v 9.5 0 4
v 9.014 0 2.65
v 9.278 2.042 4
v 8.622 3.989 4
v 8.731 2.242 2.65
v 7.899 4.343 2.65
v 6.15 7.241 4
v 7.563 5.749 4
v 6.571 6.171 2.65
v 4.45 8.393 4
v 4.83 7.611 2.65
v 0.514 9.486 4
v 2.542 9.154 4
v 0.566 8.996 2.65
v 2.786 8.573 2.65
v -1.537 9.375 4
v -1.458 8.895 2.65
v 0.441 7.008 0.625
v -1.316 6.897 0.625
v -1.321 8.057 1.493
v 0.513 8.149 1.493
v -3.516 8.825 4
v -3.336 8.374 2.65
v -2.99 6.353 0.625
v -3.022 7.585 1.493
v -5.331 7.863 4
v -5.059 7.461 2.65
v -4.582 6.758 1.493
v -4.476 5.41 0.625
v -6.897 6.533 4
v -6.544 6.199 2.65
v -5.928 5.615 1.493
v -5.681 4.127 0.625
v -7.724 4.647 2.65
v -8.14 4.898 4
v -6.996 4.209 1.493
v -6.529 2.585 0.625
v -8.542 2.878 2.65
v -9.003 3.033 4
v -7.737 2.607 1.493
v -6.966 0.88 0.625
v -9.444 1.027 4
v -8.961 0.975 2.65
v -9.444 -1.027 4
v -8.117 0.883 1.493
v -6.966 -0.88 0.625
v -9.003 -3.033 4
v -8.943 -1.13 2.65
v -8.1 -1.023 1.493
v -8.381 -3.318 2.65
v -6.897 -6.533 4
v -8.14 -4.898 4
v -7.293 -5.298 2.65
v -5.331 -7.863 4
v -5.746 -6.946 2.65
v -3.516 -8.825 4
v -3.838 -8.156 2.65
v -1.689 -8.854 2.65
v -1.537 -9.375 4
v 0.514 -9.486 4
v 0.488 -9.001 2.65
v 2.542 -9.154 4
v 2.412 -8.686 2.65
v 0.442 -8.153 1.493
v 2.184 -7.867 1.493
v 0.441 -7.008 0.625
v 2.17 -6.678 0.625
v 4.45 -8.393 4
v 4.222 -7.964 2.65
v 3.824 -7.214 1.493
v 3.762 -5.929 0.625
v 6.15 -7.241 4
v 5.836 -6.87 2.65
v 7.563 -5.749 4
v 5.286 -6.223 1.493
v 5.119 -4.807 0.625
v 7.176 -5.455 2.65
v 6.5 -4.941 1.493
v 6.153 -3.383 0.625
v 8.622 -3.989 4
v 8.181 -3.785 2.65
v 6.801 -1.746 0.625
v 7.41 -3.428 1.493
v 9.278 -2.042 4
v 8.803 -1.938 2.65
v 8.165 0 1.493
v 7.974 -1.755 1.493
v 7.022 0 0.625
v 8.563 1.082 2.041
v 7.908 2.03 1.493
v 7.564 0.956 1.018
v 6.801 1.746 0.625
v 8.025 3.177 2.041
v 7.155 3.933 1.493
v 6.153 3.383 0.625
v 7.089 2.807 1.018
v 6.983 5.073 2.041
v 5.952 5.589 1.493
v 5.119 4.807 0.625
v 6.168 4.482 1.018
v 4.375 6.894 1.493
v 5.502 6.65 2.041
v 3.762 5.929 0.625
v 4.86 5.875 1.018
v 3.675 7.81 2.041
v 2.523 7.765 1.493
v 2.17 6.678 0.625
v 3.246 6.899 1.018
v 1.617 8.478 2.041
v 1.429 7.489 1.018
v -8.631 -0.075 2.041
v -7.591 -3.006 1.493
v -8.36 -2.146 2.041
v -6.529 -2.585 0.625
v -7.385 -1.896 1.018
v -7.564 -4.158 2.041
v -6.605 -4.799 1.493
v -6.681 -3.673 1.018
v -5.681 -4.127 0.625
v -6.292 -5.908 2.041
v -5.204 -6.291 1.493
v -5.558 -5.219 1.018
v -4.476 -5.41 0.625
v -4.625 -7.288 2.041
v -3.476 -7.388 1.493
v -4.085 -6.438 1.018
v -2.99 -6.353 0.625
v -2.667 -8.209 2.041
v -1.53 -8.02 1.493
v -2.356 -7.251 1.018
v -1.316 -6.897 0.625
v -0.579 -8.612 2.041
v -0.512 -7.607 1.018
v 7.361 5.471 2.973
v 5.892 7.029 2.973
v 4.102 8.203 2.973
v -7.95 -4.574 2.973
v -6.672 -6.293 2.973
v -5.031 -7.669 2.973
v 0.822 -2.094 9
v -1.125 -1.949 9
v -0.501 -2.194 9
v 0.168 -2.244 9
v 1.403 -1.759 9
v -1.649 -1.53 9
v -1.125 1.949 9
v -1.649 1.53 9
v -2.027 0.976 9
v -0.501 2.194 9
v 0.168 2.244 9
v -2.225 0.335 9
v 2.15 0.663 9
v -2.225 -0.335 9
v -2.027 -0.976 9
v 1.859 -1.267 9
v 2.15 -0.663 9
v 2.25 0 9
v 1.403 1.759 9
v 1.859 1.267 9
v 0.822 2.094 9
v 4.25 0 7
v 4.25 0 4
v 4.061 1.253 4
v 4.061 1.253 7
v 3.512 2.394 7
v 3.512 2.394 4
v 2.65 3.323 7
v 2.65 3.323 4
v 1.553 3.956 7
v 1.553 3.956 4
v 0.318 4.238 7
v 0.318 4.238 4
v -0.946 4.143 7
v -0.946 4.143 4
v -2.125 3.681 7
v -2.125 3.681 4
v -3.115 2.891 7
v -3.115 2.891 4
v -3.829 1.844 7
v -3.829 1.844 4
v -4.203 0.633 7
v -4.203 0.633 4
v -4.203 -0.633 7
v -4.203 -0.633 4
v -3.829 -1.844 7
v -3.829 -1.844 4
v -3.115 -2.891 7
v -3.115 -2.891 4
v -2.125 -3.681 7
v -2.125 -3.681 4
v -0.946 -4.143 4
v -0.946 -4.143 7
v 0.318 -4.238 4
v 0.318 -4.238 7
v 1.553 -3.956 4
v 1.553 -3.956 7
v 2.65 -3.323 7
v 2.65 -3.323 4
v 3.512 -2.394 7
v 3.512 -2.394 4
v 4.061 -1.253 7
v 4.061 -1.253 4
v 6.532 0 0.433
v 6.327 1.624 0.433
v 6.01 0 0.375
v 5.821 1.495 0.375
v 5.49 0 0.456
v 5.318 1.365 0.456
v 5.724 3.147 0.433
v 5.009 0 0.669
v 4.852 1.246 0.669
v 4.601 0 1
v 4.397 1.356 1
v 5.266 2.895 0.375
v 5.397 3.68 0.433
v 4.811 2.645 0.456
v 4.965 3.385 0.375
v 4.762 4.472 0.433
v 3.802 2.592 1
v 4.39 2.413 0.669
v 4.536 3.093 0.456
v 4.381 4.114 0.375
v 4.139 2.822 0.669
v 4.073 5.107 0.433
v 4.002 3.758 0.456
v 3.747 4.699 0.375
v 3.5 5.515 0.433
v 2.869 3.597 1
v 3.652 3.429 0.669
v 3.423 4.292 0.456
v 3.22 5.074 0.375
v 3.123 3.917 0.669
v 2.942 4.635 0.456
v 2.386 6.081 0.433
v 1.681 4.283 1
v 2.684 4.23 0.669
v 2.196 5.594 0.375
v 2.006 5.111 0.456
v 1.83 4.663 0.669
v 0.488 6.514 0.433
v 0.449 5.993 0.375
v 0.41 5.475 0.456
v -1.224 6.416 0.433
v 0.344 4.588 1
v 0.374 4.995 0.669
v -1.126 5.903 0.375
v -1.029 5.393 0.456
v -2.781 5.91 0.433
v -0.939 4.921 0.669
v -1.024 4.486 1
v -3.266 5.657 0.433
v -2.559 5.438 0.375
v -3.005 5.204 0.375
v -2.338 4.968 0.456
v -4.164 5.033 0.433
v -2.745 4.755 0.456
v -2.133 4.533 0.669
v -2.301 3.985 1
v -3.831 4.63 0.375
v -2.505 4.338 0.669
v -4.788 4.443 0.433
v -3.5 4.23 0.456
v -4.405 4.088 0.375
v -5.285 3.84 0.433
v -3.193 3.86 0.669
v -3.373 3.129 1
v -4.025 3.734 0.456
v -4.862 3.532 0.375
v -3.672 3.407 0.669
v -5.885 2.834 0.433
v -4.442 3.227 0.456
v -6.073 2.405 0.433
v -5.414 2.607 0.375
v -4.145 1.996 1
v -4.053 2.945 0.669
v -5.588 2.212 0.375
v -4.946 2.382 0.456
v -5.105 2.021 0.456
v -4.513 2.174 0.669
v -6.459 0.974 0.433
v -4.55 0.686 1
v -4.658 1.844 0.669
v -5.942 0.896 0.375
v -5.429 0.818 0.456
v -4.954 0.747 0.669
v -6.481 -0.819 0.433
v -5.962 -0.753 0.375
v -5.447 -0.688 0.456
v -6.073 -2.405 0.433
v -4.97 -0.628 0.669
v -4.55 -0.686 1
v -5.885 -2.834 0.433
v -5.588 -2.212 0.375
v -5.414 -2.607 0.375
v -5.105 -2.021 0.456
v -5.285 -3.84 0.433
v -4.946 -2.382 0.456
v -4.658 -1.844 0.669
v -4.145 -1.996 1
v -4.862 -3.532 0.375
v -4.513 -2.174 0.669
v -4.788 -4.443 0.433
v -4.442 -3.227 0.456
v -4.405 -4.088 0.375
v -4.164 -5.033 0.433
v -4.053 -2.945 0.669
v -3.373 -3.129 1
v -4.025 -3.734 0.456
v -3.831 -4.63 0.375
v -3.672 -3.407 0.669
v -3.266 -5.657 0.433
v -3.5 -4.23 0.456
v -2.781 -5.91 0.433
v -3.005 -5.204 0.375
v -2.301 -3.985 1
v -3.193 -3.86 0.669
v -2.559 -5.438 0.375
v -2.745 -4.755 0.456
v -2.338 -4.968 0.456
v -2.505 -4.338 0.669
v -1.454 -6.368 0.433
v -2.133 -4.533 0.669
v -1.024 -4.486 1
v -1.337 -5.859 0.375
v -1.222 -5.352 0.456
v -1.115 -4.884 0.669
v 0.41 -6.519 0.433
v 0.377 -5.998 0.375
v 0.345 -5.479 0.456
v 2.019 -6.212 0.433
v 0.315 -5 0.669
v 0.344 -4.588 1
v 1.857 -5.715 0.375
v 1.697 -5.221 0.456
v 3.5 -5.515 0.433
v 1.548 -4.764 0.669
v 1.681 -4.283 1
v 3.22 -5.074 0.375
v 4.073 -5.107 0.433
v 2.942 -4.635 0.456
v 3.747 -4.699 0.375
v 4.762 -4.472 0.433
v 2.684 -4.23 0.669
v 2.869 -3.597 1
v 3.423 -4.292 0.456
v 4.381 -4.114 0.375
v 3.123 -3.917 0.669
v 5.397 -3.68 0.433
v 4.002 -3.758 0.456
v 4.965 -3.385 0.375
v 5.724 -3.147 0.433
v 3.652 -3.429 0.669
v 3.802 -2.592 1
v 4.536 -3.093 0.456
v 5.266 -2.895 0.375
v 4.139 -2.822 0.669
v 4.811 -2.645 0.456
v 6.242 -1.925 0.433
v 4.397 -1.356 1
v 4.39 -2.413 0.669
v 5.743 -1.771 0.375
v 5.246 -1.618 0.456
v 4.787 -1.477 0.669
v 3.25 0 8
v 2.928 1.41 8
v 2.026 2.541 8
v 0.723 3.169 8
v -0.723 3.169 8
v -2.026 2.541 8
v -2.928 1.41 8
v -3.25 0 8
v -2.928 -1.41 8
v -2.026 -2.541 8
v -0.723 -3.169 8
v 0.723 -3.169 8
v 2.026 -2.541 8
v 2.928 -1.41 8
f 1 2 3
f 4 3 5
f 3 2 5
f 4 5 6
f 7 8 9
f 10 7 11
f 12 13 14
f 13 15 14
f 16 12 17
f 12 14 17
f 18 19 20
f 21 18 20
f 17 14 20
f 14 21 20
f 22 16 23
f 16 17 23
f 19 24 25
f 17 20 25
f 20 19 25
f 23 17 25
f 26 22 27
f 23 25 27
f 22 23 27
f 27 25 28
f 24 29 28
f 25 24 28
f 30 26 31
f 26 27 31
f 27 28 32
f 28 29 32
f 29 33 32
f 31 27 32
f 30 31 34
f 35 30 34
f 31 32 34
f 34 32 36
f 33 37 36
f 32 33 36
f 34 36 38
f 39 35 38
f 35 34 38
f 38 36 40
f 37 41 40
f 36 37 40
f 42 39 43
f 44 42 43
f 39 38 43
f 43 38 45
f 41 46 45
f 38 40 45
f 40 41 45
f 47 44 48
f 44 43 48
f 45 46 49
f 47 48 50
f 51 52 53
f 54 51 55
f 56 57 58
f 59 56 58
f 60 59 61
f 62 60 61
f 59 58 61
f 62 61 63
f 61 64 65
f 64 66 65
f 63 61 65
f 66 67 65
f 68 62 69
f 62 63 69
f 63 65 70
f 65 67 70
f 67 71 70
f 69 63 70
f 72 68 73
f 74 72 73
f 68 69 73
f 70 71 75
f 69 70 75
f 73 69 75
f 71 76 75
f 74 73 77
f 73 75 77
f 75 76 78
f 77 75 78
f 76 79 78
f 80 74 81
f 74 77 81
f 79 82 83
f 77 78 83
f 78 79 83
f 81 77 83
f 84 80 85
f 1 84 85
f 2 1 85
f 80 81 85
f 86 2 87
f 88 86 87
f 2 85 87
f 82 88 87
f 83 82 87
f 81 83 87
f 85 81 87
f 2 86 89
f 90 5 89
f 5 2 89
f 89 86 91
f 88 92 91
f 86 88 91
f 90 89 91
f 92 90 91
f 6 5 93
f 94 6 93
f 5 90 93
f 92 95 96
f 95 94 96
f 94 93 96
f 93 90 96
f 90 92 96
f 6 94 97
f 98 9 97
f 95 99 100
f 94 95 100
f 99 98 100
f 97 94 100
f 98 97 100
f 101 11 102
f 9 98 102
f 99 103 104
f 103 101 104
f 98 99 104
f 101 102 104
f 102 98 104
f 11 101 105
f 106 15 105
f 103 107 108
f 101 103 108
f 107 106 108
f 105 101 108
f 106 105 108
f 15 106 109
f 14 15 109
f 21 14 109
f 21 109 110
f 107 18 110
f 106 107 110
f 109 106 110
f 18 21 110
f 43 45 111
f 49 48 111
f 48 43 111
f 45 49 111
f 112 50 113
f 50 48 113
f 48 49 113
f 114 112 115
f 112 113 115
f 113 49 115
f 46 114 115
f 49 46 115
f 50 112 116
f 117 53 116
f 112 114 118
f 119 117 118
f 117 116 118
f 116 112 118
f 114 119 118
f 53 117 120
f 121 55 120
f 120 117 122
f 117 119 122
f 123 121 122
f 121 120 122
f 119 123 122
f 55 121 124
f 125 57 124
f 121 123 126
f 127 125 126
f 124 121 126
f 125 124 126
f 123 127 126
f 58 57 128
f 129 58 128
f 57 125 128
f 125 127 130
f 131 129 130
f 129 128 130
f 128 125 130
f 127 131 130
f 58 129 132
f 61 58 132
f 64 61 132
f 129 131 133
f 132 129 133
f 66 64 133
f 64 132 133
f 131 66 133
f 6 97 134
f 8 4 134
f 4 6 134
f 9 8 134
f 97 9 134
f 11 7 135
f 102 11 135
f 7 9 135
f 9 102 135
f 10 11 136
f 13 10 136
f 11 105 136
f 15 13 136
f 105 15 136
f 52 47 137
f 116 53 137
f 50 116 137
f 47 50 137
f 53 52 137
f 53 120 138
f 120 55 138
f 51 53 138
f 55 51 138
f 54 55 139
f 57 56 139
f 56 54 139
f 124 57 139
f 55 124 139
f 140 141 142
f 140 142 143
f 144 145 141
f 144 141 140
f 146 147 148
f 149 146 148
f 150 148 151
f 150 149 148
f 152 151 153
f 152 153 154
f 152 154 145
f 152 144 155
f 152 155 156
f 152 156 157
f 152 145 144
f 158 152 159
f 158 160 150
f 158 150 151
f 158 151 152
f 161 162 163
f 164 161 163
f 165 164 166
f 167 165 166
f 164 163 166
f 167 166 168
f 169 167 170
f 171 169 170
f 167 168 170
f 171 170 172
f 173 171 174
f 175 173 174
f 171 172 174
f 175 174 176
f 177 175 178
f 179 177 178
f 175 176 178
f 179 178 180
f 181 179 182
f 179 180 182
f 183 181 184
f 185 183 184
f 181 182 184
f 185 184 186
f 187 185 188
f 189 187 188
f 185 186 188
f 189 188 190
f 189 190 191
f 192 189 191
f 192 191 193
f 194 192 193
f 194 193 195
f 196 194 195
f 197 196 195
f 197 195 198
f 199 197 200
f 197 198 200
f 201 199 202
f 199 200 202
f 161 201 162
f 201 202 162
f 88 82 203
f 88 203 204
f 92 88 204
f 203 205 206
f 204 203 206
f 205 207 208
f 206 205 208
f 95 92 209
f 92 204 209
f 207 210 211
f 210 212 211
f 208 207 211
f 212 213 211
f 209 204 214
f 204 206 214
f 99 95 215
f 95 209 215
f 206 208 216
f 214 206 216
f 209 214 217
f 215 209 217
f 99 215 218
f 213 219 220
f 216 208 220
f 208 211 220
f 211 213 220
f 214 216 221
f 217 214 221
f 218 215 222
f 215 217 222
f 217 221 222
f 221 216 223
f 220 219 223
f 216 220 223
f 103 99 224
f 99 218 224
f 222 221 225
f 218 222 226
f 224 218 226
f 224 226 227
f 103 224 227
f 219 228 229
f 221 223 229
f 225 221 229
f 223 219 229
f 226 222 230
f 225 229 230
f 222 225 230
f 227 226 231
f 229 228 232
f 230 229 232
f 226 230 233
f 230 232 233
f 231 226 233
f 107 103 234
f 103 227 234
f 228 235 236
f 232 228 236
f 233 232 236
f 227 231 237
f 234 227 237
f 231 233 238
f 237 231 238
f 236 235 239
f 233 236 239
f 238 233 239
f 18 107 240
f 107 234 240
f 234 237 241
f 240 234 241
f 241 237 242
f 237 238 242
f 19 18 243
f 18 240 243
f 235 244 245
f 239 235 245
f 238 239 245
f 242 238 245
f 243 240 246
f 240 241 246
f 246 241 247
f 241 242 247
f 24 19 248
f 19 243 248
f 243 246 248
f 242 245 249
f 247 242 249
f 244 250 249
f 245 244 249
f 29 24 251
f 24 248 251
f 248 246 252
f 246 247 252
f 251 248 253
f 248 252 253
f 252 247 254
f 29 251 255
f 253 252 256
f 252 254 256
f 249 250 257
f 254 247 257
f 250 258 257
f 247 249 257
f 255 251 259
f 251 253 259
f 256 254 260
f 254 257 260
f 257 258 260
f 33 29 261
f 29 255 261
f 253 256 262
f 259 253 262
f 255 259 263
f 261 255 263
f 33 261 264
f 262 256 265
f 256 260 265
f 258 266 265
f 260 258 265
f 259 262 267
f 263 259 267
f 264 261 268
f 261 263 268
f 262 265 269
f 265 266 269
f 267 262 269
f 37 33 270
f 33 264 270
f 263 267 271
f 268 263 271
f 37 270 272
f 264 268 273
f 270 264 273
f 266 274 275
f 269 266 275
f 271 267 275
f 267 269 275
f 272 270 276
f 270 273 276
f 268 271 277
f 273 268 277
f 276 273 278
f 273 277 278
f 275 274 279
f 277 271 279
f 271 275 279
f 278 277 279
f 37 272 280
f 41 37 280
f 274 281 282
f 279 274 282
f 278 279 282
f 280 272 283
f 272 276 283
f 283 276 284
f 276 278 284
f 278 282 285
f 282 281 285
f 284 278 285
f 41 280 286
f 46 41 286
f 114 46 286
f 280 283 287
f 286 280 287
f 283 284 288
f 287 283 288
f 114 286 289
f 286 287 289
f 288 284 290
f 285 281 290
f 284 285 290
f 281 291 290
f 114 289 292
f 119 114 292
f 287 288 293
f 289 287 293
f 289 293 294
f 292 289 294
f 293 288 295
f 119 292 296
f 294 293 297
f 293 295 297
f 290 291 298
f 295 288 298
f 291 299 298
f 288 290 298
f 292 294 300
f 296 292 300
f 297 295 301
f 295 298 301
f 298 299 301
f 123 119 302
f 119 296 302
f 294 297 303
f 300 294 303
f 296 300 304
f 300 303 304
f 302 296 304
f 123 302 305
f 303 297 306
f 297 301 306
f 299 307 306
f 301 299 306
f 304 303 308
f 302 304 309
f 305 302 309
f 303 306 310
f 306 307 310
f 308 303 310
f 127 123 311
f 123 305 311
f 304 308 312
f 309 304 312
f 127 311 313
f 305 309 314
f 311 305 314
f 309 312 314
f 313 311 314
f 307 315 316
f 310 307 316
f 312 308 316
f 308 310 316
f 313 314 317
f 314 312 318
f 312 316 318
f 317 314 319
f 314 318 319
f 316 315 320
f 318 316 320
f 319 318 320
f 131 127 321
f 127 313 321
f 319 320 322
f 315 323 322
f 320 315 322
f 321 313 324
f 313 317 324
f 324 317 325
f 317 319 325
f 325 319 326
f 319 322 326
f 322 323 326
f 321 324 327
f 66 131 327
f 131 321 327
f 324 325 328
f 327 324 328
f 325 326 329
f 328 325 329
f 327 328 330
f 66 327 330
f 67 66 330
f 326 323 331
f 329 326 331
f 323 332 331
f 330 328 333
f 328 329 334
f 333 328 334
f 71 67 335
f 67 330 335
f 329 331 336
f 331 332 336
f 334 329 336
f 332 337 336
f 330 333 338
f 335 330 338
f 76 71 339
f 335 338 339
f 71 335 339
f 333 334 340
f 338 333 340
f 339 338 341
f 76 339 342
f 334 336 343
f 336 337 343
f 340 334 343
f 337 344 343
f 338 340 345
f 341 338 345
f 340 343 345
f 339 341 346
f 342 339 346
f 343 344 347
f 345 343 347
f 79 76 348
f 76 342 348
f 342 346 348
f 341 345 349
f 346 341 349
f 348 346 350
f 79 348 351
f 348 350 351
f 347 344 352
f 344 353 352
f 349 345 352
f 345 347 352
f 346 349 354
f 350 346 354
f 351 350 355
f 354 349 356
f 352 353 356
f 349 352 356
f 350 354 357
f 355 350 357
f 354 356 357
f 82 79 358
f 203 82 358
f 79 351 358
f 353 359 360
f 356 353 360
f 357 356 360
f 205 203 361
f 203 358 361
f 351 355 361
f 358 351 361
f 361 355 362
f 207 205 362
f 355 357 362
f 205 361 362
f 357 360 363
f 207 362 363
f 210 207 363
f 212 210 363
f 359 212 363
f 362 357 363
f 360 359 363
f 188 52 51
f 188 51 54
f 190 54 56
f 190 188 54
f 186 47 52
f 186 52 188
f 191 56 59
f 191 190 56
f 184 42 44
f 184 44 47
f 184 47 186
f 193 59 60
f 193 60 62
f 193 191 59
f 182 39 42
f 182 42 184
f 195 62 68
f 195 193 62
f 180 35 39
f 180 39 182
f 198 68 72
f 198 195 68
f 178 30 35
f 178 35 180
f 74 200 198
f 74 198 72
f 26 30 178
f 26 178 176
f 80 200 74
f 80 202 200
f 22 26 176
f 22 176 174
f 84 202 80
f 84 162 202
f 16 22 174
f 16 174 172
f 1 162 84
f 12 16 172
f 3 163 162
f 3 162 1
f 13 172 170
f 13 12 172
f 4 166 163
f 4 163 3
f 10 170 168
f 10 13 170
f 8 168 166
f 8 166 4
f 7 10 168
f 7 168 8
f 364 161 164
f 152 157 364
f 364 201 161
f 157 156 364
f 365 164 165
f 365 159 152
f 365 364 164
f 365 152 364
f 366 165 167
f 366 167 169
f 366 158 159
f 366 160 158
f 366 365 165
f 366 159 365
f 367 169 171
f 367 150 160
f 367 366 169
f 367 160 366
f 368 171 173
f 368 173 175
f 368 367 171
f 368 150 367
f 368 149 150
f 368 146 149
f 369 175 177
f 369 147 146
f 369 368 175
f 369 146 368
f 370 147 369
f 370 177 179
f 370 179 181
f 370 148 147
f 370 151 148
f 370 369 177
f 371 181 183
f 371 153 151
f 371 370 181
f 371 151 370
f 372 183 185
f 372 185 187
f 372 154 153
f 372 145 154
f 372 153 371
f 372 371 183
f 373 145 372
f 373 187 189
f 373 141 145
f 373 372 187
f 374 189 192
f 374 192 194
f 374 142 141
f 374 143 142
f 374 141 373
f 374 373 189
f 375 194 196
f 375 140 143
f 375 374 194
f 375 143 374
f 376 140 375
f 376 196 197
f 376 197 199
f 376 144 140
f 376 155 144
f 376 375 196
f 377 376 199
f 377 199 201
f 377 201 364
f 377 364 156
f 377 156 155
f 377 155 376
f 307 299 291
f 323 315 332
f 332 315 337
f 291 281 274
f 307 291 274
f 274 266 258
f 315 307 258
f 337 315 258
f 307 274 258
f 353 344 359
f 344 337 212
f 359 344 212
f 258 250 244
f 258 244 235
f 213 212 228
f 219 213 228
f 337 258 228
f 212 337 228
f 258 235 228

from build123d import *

# Parameters (mm, degrees)
F0_R     = 9.5
F1_DEPTH = 4
F2_R     = 4.25
F3_DEPTH = 5
F5_SIZE  = 2
F6_DEPTH = 1


# Not quite as in the source:
# - a fillet or chamfer that OpenCascade refuses, or shapes differently, is made with other operations: its cross-section is extruded or revolved along the edge and cut away or added


with BuildPart() as f1:
    # F0 (on Top) → F1 (new body)
    with BuildSketch(Plane.XY):
        Circle(F0_R)
    extrude(amount=F1_DEPTH)

    # F2 (on face) → F3 (join)
    with BuildSketch(Plane.XY.offset(4)):
        Circle(F2_R)
    extrude(amount=F3_DEPTH)

    # F4: fillet of radius 5 on 1 edges, made by hand

    # F4_s1 → F4_t2 (revolve, cut)
    with BuildSketch(Plane.XZ):
        with BuildLine():
            ThreePointArc((9.5, 4), (7.7632981746, 1.1270166538), (4.6010205144, 0))
            Line((4.6010205144, 0), (9.5, 0))
            Line((9.5, 0), (9.5, 4))
        make_face()
    revolve(axis=Axis((0, 0, 0), (0, 0, 1)), mode=Mode.SUBTRACT)

    # F5
    f5_edges = [f1.edges().sort_by_distance(p)[0] for p in [
        (-4.25, 0, 9),
    ]]
    chamfer(f5_edges, length=F5_SIZE)

    # F6 (cut): a face of the model
    f6_faces = [f1.faces().sort_by_distance(p)[0] for p in [
        (0, 0, 0),
    ]]
    extrude(f6_faces, amount=-F6_DEPTH, mode=Mode.SUBTRACT)

    # F7: fillet of radius 2 on 1 edges, made by hand

    # F7_s1 → F7_t2 (revolve, cut)
    with BuildSketch(Plane.XZ):
        with BuildLine():
            ThreePointArc((7.0216351058, 0.625), (5.7472030514, 0.3985764624), (4.6010205144, 1))
            Line((4.6010205144, 1), (4.6010205144, 0))
            ThreePointArc((4.6010205144, 0), (5.8510205144, 0.1587708172), (7.0216351058, 0.625))
        make_face()
    revolve(axis=Axis((0, 0, 0), (0, 0, 1)), mode=Mode.SUBTRACT)


solid = f1.part
